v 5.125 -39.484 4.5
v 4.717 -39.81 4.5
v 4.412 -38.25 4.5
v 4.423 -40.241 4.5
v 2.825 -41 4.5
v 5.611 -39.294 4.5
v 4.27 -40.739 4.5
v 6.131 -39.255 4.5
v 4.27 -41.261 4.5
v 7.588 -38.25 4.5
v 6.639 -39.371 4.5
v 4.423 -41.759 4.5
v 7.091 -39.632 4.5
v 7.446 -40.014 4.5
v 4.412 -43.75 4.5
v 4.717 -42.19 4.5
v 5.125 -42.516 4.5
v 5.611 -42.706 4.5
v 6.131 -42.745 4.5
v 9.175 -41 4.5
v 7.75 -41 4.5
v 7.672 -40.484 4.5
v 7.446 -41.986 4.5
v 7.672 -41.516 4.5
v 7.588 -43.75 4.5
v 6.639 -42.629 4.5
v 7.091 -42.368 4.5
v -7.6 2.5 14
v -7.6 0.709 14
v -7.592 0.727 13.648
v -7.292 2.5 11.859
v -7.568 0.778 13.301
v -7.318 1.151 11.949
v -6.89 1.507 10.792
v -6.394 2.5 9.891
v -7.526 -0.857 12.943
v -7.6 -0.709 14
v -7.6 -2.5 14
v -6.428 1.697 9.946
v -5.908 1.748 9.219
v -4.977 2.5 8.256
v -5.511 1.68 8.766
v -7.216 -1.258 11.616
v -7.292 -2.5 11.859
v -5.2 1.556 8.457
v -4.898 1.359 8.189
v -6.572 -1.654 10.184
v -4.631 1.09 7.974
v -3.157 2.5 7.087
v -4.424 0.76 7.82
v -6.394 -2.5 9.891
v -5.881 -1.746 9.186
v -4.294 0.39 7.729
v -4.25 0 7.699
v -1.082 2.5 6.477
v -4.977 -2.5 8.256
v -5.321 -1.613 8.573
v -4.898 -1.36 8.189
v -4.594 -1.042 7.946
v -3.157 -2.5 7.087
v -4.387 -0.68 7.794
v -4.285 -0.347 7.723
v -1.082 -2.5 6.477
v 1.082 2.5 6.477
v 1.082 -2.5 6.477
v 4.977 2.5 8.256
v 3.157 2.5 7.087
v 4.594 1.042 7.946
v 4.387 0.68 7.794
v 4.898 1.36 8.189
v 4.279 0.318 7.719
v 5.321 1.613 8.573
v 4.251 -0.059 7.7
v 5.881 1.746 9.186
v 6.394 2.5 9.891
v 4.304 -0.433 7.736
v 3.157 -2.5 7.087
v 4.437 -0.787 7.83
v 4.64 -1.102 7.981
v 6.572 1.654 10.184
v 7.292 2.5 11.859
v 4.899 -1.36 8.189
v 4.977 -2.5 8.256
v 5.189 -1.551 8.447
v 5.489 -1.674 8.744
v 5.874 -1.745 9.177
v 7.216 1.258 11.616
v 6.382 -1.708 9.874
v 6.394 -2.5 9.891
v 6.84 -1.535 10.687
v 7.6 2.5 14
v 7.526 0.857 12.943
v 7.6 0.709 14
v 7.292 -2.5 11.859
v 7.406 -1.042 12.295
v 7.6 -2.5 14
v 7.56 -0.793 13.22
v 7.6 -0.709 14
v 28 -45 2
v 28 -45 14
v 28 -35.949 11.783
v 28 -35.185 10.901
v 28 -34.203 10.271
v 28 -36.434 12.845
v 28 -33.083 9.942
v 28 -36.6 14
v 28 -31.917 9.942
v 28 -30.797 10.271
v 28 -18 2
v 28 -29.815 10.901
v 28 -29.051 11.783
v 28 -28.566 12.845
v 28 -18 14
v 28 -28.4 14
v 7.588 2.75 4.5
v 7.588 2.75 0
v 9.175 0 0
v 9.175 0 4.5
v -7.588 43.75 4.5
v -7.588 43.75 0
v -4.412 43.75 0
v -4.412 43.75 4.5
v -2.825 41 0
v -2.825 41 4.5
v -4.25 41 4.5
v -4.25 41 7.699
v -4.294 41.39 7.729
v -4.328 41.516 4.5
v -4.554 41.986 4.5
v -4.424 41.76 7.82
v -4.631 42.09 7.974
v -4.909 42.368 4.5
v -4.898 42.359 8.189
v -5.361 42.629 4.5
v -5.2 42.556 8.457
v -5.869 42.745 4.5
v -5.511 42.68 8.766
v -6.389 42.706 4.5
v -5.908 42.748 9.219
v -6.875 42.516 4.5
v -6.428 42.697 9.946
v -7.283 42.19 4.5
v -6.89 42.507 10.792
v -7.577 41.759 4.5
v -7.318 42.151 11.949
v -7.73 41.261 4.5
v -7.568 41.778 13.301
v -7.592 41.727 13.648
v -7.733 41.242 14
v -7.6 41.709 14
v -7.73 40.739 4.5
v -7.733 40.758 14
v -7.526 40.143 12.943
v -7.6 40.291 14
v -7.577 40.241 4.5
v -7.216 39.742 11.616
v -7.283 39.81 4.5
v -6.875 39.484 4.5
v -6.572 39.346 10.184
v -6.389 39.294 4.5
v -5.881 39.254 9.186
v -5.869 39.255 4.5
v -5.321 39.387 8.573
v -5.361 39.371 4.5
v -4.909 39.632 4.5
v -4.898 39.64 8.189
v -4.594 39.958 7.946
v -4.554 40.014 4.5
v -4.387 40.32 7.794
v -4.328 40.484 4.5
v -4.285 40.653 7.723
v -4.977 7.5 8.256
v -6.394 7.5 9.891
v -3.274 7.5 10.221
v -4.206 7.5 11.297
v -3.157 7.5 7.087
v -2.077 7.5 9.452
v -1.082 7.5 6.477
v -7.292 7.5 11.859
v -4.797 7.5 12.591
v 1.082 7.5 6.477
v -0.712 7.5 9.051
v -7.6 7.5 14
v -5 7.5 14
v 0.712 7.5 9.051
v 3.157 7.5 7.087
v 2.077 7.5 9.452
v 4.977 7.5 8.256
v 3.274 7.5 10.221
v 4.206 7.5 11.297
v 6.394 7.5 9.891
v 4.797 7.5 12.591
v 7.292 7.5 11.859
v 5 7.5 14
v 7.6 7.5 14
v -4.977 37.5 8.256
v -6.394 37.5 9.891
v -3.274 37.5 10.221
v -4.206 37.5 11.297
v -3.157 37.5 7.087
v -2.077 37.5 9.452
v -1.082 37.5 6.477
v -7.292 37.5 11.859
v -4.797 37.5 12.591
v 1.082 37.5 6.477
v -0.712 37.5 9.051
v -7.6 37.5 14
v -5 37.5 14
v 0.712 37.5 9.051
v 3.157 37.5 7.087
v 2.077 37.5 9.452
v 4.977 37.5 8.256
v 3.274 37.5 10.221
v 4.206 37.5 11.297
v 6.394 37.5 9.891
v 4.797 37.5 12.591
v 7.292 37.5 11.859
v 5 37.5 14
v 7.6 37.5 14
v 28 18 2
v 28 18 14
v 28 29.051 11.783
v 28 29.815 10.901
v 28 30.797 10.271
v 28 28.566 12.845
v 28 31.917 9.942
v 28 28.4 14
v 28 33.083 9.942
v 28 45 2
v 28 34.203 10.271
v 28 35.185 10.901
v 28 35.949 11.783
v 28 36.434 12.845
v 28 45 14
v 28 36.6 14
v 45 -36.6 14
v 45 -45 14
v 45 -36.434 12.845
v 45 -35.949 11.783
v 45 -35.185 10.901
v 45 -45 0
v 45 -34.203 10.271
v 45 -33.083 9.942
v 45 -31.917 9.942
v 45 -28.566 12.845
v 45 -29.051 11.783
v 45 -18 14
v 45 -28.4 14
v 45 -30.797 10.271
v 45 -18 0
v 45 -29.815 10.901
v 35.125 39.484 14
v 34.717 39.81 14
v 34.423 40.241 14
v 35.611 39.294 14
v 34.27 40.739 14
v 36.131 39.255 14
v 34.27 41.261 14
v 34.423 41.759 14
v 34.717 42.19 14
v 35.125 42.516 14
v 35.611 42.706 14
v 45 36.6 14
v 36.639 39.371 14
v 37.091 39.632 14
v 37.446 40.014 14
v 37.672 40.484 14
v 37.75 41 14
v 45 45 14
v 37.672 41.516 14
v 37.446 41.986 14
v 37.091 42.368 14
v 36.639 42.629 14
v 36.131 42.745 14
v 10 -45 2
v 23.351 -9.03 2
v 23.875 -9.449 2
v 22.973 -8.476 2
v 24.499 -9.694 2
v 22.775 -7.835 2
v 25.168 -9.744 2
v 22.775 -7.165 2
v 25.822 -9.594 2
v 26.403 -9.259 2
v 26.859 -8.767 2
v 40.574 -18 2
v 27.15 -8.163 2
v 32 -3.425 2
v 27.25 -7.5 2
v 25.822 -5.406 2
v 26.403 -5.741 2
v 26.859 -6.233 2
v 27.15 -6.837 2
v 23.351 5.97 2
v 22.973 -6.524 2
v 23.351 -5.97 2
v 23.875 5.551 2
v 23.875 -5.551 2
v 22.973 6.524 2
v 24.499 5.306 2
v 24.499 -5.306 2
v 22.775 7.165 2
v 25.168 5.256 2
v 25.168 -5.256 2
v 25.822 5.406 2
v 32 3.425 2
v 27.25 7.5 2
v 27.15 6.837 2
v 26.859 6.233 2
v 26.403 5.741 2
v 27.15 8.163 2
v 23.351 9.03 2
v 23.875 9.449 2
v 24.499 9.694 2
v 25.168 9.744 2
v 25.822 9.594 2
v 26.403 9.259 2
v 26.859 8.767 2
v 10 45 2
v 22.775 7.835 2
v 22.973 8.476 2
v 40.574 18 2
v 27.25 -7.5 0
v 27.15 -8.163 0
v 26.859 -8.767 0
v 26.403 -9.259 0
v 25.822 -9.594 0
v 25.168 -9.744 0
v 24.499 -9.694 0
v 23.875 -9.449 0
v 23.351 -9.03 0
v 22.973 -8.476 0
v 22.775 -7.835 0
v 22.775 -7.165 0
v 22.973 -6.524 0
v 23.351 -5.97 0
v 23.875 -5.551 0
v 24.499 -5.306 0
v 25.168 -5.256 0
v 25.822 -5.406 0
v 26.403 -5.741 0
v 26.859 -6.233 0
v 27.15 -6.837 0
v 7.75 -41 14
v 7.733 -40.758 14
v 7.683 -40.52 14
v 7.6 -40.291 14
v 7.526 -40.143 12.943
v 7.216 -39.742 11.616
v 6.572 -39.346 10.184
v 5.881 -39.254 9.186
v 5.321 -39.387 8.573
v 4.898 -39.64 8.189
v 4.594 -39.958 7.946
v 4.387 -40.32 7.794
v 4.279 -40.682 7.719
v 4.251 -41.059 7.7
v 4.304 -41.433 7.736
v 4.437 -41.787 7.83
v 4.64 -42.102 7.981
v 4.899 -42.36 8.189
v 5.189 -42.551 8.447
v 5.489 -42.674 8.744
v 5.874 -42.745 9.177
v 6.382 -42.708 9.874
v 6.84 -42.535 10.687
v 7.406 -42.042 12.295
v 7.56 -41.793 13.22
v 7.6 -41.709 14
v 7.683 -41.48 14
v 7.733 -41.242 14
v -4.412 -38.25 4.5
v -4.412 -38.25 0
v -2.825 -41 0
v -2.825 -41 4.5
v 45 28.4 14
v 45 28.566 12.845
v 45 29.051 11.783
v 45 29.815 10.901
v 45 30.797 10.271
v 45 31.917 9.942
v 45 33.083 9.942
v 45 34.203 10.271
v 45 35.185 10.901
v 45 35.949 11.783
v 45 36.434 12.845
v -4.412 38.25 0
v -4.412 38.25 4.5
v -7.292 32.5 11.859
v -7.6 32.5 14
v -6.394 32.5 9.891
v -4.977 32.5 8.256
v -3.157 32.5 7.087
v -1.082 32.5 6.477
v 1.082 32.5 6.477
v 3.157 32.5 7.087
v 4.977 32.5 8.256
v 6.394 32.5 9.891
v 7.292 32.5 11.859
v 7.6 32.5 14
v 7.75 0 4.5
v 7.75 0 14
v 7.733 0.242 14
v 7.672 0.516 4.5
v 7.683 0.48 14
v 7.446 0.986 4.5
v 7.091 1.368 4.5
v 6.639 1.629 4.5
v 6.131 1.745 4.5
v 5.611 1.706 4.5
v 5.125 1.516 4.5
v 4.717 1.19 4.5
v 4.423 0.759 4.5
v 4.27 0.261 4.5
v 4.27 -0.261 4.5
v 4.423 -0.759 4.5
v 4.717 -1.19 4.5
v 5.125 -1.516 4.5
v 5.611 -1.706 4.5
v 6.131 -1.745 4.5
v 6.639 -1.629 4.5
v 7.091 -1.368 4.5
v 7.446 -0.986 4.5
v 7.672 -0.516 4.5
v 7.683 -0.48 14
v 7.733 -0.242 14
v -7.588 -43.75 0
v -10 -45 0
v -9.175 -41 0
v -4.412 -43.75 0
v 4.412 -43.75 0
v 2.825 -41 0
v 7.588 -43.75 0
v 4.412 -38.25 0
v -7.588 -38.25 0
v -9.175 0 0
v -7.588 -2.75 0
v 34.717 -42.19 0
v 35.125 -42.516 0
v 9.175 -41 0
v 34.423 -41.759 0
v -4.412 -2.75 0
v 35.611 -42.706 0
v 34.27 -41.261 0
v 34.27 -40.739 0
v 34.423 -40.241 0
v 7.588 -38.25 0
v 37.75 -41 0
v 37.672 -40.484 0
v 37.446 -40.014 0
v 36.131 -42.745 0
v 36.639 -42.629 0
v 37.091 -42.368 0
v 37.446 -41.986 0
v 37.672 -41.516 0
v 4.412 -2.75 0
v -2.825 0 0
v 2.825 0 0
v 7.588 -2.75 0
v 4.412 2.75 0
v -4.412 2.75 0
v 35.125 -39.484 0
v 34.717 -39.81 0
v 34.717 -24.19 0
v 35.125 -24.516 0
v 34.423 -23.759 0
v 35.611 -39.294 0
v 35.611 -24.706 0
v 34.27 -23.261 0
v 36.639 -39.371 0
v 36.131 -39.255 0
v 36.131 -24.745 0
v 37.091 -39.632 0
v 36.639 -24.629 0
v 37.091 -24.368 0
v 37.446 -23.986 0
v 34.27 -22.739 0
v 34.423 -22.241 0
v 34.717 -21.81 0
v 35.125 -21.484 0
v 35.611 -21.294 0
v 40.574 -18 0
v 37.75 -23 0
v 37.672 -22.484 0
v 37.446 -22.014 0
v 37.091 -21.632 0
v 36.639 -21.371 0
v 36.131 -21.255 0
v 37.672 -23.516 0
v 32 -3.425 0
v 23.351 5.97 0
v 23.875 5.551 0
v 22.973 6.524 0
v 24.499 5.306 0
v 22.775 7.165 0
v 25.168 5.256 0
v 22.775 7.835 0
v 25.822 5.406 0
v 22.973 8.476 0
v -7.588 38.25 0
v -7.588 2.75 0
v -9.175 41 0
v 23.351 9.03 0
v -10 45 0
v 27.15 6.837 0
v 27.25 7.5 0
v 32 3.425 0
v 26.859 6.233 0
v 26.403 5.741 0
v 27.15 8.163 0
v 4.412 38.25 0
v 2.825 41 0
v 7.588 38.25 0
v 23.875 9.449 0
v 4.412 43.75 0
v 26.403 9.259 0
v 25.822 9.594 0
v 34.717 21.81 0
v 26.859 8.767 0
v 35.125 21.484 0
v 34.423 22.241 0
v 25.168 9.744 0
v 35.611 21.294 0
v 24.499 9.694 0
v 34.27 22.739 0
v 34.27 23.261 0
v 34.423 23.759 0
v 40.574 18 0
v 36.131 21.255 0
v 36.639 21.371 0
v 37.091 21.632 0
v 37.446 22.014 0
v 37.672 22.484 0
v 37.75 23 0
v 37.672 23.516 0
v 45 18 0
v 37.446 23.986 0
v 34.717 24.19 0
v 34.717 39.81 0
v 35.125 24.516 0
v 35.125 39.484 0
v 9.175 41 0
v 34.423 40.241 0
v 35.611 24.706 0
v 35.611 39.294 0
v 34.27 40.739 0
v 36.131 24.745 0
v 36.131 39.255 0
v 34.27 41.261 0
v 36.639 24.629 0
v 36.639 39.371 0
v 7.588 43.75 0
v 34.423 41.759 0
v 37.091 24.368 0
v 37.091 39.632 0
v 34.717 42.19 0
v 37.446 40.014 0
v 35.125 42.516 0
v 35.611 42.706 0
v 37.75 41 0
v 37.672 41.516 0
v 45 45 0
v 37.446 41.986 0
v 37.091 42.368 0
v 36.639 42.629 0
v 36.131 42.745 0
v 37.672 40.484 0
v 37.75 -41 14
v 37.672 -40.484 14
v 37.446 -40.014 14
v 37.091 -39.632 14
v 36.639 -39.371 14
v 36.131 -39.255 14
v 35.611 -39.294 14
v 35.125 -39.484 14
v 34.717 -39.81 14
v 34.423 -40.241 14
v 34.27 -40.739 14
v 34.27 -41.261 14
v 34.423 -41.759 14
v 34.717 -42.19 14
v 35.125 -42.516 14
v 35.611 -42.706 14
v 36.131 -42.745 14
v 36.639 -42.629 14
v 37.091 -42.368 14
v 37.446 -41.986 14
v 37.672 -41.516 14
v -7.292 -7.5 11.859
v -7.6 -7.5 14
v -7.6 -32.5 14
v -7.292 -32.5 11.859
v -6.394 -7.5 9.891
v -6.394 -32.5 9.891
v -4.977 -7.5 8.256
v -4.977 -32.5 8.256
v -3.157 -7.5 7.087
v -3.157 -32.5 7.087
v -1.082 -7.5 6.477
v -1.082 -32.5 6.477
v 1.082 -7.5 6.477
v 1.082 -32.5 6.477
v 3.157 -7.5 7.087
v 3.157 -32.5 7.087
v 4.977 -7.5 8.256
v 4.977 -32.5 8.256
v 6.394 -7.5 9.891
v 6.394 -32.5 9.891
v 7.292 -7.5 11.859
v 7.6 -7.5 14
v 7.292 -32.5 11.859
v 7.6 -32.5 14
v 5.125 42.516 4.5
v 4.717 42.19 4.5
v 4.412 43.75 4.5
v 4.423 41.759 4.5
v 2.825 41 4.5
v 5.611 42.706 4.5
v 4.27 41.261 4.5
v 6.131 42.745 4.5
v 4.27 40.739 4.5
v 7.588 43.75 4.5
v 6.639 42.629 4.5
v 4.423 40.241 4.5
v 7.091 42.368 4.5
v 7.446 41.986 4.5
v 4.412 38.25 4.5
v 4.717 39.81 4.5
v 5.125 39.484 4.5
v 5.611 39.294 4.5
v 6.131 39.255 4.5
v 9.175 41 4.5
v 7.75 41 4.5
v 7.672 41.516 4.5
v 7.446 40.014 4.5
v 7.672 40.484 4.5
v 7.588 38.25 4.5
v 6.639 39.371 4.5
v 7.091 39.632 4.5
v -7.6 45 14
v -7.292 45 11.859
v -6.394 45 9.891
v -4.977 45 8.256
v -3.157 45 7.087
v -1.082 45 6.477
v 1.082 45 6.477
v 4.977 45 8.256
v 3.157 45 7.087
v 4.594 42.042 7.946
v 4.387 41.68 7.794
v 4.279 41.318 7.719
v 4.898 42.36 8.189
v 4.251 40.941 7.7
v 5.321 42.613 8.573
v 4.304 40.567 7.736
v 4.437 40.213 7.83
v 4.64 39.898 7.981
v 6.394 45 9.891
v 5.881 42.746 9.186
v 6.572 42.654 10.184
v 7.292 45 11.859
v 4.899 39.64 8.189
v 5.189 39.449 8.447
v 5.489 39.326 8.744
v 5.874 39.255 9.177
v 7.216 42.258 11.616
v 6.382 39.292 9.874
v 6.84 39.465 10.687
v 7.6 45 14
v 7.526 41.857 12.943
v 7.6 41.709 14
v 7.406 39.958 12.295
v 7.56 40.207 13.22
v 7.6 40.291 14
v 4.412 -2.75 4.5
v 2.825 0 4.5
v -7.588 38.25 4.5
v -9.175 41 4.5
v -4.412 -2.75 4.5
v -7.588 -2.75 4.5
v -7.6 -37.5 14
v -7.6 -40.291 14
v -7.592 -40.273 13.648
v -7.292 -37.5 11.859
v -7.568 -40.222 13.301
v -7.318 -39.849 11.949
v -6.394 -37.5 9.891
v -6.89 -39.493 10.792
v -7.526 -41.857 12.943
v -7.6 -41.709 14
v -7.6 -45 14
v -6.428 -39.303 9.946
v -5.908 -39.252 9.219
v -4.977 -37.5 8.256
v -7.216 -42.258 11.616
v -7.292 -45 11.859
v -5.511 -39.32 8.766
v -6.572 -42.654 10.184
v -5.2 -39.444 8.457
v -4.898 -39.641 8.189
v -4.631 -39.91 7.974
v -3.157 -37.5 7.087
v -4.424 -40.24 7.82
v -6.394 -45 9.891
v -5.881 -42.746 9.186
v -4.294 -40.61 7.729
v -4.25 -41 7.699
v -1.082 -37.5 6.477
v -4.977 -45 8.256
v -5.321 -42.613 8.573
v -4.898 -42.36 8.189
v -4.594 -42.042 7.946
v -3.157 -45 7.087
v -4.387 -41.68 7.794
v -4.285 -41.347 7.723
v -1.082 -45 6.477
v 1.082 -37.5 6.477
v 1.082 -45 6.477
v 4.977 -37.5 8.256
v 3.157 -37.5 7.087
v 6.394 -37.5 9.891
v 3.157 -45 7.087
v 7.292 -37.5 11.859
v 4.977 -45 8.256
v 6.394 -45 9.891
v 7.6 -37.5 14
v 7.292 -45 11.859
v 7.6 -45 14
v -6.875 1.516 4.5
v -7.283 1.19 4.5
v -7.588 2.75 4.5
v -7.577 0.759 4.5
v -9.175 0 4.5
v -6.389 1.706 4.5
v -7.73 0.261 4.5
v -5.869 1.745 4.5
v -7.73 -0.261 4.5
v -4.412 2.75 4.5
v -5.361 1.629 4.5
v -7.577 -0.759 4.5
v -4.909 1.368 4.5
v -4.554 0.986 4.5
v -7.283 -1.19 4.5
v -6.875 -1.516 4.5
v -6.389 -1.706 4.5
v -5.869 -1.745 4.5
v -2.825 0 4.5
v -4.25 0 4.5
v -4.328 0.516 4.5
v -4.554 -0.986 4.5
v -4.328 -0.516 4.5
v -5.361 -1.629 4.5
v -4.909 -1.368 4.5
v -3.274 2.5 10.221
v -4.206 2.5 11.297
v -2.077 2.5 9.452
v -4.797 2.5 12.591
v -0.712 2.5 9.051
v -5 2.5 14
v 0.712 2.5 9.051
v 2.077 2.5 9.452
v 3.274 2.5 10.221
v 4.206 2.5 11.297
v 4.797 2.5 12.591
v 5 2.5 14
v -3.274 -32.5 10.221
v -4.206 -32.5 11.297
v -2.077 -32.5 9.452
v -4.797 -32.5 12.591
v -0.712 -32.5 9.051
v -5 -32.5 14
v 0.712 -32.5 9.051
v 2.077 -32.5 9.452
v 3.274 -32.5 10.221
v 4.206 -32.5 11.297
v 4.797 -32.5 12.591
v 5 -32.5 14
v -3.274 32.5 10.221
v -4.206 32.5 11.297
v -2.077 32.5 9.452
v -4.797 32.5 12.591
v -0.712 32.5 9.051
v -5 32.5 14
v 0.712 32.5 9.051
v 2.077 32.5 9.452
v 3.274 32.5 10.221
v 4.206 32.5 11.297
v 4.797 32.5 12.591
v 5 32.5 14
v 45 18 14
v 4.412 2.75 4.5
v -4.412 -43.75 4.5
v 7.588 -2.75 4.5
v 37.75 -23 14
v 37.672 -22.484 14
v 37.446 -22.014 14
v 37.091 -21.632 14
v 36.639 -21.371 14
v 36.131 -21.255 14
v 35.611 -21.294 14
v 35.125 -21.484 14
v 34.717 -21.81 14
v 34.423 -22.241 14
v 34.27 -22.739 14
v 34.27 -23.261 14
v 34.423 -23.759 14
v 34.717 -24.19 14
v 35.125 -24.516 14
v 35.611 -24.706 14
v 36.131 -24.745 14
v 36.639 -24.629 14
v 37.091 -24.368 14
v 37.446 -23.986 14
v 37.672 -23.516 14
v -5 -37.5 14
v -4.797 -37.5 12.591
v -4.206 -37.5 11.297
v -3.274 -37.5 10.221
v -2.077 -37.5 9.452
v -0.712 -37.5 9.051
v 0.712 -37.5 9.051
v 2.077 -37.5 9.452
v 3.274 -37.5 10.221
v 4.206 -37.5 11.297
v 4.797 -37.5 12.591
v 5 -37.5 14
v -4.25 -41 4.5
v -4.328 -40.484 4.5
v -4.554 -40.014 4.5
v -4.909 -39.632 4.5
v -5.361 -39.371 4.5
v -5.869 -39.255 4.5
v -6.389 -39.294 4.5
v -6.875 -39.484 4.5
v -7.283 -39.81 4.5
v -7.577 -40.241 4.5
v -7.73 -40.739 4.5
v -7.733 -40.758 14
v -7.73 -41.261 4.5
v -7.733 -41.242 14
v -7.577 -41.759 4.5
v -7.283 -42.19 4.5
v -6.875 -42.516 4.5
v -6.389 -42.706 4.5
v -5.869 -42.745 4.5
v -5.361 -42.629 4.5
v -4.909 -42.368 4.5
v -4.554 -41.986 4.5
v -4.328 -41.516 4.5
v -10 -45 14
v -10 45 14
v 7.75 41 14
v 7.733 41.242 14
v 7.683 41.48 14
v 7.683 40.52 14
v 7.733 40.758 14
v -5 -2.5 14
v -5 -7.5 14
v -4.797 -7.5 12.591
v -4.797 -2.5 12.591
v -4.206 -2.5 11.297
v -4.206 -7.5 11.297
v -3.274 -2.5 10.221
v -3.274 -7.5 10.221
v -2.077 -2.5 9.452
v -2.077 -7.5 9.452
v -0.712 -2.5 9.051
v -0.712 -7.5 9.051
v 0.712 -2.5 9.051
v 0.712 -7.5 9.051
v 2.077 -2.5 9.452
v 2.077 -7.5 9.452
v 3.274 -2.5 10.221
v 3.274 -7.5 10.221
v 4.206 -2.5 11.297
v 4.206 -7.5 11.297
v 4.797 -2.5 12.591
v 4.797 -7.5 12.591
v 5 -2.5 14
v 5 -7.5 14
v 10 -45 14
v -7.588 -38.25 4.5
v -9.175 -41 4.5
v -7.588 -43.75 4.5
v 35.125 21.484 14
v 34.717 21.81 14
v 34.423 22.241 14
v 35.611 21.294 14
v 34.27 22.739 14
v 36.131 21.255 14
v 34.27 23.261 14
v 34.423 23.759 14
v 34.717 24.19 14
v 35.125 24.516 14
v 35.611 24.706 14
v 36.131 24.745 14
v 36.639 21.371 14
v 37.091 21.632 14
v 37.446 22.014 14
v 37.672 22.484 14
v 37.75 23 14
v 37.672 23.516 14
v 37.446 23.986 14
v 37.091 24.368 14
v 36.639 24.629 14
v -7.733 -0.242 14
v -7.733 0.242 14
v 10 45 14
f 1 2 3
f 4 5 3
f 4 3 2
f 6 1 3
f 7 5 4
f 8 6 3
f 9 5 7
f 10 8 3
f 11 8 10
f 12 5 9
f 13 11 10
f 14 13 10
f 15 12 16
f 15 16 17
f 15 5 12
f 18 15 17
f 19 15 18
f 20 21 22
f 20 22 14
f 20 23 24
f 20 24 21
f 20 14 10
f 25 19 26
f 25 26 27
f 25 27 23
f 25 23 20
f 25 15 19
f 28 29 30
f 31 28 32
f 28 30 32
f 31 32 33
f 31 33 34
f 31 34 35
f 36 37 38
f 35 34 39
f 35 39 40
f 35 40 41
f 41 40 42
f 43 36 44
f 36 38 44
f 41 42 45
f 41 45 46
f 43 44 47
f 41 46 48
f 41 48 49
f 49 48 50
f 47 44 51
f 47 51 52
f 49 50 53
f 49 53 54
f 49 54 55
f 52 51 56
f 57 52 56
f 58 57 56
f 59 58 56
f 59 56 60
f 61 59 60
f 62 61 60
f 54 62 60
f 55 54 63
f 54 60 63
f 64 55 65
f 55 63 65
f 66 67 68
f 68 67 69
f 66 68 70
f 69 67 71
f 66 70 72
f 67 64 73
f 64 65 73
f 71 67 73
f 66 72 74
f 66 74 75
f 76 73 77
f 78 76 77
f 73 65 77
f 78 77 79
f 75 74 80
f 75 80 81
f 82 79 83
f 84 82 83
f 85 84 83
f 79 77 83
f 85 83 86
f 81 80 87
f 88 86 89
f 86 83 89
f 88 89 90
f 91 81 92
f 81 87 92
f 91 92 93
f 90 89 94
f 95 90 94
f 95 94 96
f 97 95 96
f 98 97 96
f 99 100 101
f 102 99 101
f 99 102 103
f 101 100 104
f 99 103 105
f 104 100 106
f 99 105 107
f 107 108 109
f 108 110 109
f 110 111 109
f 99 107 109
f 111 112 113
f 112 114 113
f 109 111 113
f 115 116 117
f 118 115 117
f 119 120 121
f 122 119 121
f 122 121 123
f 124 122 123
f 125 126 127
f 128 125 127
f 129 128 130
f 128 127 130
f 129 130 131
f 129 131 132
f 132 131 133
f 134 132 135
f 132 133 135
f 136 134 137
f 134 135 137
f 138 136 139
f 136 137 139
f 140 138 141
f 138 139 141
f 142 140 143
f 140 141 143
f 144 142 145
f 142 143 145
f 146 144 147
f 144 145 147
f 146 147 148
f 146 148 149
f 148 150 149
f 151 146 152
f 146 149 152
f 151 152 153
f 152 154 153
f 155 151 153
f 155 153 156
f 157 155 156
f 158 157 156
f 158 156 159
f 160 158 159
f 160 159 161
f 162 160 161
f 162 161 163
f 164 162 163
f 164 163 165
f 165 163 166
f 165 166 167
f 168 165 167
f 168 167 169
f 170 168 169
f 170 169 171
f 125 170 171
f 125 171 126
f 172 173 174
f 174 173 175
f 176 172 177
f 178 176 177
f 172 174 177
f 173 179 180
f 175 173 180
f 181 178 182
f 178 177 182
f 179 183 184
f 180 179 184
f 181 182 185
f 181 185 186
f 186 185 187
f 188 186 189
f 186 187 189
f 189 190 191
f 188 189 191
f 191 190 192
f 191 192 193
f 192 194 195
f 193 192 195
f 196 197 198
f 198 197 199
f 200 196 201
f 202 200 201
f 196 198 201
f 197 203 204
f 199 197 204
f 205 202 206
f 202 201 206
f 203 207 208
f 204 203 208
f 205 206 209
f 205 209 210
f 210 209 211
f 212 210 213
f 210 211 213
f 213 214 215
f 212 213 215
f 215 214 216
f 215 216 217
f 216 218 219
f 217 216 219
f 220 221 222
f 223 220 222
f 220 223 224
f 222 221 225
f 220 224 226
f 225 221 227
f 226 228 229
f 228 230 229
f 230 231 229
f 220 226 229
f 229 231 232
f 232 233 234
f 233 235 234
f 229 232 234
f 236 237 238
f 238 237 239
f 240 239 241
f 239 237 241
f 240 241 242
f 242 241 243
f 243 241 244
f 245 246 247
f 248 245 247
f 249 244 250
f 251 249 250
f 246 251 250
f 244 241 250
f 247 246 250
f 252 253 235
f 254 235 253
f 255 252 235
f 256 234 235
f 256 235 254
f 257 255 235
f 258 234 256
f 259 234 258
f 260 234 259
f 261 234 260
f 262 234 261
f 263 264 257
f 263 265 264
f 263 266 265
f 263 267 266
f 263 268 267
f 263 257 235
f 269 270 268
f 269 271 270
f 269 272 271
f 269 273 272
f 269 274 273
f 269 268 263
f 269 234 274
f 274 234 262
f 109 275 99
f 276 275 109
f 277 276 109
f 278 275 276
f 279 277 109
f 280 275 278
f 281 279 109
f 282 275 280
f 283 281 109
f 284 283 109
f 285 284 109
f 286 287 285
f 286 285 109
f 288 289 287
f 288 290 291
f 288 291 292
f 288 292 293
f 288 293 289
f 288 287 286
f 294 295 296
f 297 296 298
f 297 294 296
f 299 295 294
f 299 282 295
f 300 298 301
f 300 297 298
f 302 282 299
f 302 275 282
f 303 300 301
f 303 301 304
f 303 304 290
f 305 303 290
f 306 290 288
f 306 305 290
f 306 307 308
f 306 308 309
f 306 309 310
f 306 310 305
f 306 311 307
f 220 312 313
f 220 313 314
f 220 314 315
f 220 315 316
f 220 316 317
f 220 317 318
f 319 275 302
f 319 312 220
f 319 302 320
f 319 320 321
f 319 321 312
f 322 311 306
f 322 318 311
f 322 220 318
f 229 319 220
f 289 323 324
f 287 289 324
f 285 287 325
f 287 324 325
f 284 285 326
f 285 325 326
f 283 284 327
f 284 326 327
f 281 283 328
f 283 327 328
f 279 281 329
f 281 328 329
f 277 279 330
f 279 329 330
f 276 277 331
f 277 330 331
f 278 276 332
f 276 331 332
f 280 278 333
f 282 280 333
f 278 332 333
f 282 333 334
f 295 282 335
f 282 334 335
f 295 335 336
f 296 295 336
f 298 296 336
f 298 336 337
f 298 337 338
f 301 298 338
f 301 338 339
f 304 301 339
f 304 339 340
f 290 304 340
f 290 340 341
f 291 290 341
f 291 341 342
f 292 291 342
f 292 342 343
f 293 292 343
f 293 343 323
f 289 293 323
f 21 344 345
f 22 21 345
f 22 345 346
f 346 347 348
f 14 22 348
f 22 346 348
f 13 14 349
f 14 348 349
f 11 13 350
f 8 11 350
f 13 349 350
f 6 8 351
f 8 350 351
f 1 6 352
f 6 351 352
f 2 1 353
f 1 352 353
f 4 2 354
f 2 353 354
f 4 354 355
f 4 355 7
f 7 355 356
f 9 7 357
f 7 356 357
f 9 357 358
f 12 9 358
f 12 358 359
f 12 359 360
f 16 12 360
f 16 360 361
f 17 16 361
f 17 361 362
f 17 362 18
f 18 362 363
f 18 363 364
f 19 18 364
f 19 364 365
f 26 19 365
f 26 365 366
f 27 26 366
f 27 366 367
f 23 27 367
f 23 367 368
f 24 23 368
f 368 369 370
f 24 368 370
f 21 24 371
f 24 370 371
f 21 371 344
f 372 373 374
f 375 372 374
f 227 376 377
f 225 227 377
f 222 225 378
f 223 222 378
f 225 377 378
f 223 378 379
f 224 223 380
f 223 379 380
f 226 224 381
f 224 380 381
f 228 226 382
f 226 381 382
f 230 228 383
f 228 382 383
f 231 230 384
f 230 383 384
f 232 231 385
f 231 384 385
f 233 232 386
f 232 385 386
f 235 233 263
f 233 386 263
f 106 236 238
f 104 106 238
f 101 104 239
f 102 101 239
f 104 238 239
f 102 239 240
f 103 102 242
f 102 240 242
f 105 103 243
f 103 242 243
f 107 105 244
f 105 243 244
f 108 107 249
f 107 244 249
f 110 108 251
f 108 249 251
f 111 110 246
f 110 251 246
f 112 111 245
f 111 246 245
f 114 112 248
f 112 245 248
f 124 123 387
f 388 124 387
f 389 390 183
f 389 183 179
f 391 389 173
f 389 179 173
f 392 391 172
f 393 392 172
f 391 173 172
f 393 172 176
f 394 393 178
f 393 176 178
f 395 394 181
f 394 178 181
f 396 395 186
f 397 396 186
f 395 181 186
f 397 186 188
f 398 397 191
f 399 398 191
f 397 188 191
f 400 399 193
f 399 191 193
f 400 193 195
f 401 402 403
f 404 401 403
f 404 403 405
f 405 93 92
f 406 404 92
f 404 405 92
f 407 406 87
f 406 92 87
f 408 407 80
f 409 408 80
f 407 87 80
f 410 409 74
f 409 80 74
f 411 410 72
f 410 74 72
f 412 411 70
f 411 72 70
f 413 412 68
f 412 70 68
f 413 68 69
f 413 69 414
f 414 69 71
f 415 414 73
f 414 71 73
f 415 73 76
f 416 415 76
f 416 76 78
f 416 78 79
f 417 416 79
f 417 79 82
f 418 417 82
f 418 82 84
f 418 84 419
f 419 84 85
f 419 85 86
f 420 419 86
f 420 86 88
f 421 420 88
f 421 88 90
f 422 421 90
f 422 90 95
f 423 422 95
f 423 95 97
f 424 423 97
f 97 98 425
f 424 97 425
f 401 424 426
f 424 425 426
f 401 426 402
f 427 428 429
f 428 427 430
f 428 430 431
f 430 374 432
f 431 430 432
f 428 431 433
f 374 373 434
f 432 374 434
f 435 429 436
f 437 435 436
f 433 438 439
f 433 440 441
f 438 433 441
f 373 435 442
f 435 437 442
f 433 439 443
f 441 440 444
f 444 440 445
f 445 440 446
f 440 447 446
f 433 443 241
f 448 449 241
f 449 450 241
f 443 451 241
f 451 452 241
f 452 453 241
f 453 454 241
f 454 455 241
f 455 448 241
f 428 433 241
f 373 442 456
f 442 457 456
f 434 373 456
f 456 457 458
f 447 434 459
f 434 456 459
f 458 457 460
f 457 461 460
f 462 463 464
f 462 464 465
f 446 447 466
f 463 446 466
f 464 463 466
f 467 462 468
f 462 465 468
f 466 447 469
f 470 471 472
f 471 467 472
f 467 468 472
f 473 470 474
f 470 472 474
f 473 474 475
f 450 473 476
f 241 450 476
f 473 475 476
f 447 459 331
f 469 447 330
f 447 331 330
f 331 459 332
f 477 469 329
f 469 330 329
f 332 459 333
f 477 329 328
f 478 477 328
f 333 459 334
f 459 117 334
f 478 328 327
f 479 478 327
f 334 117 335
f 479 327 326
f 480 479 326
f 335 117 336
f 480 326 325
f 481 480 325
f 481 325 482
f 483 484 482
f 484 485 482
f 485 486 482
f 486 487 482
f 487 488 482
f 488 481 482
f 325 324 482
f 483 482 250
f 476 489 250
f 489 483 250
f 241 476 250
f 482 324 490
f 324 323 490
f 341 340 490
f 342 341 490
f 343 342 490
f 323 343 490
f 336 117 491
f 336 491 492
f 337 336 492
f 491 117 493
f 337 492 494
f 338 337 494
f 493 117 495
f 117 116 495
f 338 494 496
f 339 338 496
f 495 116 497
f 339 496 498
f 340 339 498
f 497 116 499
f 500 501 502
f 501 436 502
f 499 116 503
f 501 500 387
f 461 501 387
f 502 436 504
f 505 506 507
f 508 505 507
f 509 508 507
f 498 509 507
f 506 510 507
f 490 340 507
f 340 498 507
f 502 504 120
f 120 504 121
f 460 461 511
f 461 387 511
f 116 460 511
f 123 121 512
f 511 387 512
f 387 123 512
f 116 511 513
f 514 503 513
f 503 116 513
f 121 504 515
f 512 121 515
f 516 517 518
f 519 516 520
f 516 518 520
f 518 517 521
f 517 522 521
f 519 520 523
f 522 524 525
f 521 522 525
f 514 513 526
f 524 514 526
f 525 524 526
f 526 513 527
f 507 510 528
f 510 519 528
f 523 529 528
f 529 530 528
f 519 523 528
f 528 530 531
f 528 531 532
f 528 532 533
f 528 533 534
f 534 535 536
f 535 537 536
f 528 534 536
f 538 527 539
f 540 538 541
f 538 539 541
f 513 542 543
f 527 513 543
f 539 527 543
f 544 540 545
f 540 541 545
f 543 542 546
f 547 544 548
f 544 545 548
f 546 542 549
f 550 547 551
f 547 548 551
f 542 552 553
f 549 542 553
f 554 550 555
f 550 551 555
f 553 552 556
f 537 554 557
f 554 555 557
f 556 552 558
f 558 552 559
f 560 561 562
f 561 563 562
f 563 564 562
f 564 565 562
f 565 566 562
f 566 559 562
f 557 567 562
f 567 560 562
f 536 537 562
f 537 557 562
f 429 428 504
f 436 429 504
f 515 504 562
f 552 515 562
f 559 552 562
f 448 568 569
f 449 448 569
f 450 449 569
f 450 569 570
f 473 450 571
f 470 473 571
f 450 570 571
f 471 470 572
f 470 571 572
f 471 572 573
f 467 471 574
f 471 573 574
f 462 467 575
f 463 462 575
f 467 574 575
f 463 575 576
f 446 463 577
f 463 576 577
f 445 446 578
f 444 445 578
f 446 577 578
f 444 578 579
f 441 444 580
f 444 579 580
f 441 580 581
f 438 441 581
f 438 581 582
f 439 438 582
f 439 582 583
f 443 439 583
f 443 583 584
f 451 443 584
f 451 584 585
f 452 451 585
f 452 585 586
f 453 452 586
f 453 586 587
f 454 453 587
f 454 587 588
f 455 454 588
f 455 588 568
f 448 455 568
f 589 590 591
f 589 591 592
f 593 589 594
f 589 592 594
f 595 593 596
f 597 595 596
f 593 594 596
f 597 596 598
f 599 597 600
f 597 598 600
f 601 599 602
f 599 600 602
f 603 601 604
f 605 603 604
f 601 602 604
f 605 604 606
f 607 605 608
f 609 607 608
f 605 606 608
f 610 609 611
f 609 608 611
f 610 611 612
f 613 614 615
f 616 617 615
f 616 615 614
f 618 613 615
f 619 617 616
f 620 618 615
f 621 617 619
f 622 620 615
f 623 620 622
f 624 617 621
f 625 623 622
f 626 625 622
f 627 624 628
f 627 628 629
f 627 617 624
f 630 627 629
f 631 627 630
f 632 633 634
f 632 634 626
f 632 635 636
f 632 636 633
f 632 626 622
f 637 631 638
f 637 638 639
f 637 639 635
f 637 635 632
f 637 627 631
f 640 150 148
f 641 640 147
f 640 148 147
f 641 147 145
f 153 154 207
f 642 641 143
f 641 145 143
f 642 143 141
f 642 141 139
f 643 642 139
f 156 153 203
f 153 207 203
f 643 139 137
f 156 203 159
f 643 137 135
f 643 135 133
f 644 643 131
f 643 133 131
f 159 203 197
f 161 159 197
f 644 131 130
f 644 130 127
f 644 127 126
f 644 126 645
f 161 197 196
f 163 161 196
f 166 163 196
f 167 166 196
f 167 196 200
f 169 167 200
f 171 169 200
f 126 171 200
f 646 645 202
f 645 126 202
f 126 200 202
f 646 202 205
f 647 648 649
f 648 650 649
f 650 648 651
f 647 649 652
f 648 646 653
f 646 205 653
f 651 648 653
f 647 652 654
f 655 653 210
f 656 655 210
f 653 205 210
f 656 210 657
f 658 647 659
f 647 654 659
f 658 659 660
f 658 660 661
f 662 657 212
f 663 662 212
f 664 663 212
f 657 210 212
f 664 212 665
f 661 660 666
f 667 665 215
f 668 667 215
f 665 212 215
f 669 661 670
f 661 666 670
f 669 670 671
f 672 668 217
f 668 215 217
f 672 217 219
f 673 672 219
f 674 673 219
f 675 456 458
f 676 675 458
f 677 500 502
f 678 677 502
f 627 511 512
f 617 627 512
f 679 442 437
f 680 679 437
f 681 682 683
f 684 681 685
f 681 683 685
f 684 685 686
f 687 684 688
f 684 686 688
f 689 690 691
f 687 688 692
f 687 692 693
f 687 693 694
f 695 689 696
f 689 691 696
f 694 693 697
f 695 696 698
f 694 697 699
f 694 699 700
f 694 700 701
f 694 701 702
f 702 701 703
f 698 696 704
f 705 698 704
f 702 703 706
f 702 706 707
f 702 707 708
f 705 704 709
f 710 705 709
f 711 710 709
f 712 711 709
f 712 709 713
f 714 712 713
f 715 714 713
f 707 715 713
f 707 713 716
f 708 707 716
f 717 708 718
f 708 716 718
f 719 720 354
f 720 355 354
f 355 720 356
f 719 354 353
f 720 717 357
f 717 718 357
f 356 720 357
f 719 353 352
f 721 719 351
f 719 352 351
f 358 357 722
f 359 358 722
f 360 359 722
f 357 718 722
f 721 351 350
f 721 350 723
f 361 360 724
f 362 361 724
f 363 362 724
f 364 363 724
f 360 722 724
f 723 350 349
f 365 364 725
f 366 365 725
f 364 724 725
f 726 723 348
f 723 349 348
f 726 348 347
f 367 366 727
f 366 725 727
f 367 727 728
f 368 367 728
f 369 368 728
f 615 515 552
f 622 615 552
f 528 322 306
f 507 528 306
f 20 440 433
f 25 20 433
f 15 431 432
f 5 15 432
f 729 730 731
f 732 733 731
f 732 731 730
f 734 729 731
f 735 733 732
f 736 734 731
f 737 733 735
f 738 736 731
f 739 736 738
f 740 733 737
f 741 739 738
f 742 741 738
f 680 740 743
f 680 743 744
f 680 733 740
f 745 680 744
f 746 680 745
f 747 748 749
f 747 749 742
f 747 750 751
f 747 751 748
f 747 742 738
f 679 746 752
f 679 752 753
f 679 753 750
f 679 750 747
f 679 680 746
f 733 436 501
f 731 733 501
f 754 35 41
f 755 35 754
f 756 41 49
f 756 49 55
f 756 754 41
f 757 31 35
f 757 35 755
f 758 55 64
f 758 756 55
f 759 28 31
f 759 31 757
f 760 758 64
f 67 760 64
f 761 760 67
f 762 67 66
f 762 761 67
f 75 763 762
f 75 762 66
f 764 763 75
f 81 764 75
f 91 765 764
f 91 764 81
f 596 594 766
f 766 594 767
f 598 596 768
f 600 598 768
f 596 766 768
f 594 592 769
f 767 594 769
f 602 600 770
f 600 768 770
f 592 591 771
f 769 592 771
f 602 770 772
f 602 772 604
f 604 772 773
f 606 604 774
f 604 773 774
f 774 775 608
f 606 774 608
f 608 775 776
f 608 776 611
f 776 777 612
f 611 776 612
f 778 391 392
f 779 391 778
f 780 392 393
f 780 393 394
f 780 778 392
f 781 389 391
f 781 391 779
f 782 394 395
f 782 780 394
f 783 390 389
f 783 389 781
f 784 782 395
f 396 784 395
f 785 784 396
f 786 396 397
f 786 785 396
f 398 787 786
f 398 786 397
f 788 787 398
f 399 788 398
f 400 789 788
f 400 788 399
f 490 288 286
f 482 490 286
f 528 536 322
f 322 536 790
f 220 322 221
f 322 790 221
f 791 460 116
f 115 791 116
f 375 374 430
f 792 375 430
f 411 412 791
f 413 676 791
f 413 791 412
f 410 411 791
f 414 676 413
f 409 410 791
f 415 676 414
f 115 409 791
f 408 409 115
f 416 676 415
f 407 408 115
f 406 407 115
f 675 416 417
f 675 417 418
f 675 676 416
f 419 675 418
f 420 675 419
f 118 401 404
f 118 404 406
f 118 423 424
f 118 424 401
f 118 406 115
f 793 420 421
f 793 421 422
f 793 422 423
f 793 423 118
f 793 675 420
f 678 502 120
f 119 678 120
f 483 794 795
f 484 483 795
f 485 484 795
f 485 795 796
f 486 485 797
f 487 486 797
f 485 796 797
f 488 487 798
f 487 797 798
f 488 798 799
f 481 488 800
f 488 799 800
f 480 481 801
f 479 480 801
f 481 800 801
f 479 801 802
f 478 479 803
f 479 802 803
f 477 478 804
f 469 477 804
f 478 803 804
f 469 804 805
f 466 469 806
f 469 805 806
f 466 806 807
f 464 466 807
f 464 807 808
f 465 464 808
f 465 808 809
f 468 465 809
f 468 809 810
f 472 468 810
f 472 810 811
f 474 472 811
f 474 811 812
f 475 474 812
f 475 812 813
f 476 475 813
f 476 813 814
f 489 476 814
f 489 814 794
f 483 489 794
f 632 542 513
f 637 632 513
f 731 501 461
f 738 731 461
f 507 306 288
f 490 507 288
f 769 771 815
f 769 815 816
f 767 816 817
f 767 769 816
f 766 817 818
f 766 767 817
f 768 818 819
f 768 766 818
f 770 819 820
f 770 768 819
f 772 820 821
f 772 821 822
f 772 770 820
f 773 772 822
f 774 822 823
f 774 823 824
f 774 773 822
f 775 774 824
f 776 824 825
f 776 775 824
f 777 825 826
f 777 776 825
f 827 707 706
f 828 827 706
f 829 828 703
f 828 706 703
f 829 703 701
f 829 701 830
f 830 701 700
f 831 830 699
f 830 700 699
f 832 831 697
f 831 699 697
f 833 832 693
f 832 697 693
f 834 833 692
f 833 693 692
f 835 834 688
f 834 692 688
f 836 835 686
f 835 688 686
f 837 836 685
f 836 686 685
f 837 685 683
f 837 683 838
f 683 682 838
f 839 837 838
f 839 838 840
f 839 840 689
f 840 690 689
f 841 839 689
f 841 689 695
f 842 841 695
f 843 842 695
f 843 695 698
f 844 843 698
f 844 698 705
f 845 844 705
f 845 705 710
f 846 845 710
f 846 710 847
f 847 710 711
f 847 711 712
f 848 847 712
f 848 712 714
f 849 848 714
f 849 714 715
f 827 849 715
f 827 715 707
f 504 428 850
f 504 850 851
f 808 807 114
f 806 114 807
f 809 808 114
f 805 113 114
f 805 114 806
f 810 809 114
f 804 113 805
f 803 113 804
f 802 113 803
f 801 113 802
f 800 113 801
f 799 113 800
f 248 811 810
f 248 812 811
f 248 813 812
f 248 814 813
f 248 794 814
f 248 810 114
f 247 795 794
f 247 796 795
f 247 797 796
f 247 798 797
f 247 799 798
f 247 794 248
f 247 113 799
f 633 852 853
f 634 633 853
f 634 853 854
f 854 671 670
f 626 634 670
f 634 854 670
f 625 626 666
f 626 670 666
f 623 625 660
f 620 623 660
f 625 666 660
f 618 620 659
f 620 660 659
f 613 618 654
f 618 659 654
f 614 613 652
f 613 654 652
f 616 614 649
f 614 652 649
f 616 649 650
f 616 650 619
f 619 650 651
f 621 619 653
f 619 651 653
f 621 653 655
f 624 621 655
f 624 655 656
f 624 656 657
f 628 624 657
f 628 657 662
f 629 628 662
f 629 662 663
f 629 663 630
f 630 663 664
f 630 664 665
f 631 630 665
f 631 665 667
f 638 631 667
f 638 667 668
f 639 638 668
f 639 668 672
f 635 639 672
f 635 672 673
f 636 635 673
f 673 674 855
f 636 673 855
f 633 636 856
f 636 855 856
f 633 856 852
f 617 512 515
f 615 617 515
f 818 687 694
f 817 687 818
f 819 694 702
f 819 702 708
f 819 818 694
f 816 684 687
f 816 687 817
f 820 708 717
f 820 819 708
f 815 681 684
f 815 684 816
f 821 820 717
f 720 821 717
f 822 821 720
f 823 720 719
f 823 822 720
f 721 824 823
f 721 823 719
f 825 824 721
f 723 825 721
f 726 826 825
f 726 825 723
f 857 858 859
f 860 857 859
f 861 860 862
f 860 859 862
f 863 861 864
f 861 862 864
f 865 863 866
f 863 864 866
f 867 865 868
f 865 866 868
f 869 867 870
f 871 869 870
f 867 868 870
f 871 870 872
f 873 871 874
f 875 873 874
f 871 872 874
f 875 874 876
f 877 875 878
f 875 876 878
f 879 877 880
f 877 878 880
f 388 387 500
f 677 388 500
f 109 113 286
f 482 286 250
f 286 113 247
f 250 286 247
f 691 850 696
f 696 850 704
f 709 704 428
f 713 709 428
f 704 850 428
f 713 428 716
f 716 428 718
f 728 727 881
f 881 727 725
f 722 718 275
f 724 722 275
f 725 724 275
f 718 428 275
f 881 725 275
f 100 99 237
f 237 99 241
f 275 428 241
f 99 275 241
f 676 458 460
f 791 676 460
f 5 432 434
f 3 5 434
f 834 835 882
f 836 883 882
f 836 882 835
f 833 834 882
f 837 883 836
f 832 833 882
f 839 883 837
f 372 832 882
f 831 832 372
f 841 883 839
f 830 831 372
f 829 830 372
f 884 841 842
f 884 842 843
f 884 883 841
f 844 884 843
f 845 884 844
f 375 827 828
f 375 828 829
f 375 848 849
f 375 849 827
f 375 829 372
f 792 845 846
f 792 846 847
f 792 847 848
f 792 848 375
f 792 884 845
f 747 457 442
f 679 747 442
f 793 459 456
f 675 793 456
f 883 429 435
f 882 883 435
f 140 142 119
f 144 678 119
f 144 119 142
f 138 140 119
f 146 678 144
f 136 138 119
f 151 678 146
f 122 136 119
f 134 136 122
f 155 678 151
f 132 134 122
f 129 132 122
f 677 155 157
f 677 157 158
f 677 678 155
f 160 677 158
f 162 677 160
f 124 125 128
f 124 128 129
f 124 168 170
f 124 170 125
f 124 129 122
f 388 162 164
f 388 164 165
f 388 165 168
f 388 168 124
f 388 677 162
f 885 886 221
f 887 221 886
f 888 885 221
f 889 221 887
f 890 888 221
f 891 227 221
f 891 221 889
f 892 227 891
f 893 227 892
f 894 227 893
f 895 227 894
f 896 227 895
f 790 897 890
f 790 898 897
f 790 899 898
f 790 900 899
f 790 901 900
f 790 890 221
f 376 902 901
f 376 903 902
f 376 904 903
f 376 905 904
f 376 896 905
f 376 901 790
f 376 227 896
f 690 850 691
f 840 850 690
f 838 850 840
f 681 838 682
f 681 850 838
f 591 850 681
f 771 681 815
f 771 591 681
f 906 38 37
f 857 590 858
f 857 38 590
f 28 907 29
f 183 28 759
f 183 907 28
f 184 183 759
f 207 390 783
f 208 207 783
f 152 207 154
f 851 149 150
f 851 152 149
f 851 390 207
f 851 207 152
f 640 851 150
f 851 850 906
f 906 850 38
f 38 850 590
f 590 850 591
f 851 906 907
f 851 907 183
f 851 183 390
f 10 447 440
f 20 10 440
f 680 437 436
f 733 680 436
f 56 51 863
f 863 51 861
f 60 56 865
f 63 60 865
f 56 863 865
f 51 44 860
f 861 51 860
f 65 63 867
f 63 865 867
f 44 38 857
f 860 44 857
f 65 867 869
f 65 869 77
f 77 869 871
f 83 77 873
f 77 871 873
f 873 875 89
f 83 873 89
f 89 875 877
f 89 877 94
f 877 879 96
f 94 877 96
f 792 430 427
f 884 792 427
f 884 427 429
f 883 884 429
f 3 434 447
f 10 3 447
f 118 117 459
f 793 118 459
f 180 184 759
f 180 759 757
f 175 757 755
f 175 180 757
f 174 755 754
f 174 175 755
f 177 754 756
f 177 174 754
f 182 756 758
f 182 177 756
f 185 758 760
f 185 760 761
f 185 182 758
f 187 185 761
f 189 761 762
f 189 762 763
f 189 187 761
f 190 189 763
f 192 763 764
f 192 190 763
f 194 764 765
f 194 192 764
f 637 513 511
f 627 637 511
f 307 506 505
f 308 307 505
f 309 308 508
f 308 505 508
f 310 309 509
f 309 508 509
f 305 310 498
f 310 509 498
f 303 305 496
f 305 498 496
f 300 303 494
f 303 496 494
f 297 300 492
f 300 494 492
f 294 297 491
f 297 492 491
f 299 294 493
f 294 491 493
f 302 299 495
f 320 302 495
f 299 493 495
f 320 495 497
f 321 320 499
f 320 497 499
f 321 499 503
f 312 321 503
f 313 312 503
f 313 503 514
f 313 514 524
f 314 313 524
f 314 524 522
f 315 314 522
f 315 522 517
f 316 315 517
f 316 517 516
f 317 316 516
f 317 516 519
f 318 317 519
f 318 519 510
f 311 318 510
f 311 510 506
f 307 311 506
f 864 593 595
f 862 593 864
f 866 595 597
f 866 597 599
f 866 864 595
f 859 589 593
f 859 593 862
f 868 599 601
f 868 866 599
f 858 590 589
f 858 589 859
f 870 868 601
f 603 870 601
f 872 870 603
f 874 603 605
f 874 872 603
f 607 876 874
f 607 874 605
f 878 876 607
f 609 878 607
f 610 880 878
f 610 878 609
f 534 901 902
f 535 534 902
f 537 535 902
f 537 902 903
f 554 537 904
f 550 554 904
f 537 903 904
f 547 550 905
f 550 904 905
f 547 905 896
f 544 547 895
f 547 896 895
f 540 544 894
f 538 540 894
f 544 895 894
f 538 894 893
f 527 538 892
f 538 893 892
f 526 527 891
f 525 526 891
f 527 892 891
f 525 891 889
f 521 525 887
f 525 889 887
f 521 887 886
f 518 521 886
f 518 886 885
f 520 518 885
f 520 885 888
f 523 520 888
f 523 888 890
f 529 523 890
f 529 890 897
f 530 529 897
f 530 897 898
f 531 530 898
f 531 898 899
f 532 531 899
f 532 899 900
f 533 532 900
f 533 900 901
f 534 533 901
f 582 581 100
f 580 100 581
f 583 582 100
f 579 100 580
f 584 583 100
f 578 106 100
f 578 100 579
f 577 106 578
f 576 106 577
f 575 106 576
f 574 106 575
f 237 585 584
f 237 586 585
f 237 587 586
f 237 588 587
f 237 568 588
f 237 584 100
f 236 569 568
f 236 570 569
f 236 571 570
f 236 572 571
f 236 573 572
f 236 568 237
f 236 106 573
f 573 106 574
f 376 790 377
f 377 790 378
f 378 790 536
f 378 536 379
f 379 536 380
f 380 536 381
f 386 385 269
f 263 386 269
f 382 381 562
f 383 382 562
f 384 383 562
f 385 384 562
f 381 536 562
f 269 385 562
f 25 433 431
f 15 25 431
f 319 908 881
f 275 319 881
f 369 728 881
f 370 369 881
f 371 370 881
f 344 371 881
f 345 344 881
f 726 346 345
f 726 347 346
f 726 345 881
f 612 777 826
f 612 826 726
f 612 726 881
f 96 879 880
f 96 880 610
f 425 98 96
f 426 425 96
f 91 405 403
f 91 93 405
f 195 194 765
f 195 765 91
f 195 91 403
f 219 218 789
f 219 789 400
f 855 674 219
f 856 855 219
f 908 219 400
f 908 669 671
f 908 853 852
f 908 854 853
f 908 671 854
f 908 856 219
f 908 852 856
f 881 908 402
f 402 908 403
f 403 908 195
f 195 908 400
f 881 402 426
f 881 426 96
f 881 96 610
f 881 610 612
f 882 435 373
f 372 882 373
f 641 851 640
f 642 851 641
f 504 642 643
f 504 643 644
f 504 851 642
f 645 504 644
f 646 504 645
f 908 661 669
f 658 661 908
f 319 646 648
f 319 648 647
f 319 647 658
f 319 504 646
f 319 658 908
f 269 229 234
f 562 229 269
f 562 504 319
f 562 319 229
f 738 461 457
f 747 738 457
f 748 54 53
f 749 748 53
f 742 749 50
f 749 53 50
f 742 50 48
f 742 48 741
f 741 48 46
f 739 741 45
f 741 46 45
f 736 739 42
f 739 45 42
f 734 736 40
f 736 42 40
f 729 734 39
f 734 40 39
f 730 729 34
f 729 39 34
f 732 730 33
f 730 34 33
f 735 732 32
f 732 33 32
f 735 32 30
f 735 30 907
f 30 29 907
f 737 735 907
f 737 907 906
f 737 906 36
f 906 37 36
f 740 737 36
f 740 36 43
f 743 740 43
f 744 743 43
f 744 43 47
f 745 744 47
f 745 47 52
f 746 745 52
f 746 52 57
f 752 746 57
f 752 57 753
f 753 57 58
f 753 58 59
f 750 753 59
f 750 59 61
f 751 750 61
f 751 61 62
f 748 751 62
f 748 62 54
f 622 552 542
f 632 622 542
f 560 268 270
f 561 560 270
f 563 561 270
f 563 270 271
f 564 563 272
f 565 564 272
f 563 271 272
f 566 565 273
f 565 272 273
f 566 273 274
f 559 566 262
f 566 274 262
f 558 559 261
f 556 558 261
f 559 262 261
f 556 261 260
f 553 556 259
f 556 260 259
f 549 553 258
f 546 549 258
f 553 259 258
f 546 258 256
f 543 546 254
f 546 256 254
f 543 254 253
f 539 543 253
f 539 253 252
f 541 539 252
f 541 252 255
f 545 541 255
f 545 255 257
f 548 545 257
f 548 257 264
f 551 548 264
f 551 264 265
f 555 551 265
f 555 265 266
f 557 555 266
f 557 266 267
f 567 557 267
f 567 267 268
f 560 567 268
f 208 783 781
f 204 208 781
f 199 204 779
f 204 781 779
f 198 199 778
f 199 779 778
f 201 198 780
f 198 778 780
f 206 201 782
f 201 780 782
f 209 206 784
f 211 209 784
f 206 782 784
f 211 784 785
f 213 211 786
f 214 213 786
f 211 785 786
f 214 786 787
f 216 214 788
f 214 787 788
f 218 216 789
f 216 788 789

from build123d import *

# Parameters (mm, degrees)
PAD003_DEPTH    = 5
PAD001_DEPTH    = 5
PAD002_DEPTH    = 5
PAD004_DEPTH    = 5
SKETCH_W        = 55
SKETCH_H        = 90
PAD_DEPTH       = 14
SKETCH001_R     = 7.6
POCKET_DEPTH    = 90.001
SKETCH002_R     = 1.75
POCKET001_DEPTH = 14.001
POCKET002_DEPTH = 12
SKETCH004_R     = 2.25
POCKET003_DEPTH = 14.001
SKETCH008_R     = 4.1
POCKET005_DEPTH = 20
POCKET007_DEPTH = 4.5
POCKET008_DEPTH = 12.5


with BuildPart() as pad003:
    # Sketch020 → Pad003 (new body)
    with BuildSketch(Plane.XZ.offset(-32.5)):
        with BuildLine():
            ThreePointArc((-7.6, 14), (0, 6.4), (7.6, 14))
            Line((7.6, 14), (5, 14))
            ThreePointArc((-5, 14), (0, 9), (5, 14))
            Line((-7.6, 14), (-5, 14))
        make_face()
    extrude(amount=-PAD003_DEPTH)


with BuildPart() as pad001:
    # Sketch018 → Pad001 (new body)
    with BuildSketch(Plane.XZ.offset(-7.5)):
        with BuildLine():
            ThreePointArc((-7.6, 14), (0, 6.4), (7.6, 14))
            Line((7.6, 14), (5, 14))
            ThreePointArc((-5, 14), (0, 9), (5, 14))
            Line((-7.6, 14), (-5, 14))
        make_face()
    extrude(amount=PAD001_DEPTH)


with BuildPart() as pad002:
    # Sketch019 → Pad002 (new body)
    with BuildSketch(Plane.XZ.offset(7.5)):
        with BuildLine():
            ThreePointArc((-7.6, 14), (0, 6.4), (7.6, 14))
            Line((7.6, 14), (5, 14))
            ThreePointArc((-5, 14), (0, 9), (5, 14))
            Line((-7.6, 14), (-5, 14))
        make_face()
    extrude(amount=-PAD002_DEPTH)


with BuildPart() as pad004:
    # Sketch021 → Pad004 (new body)
    with BuildSketch(Plane.XZ.offset(32.5)):
        with BuildLine():
            ThreePointArc((-7.6, 14), (0, 6.4), (7.6, 14))
            Line((7.6, 14), (5, 14))
            ThreePointArc((-5, 14), (0, 9), (5, 14))
            Line((-7.6, 14), (-5, 14))
        make_face()
    extrude(amount=PAD004_DEPTH)


with BuildPart() as fusion:
    # Sketch → Pad (new body)
    with BuildSketch(Plane.XY):
        with Locations((17.5, 0)):
            Rectangle(SKETCH_W, SKETCH_H)
    extrude(amount=PAD_DEPTH)

    # Sketch001 → Pocket (cut, through all)
    with BuildSketch(Plane.XZ.offset(45)):
        with Locations((0, 14)):
            Circle(SKETCH001_R)
    extrude(amount=-POCKET_DEPTH, mode=Mode.SUBTRACT)

    # Sketch002 → Pocket001 (cut, through all)
    with BuildSketch(Plane.XY.offset(14)):
        with Locations((-6, 41)):
            Circle(SKETCH002_R)
        with Locations((-6, -41)):
            Circle(SKETCH002_R)
        with Locations((6, 41)):
            Circle(SKETCH002_R)
        with Locations((6, -41)):
            Circle(SKETCH002_R)
        with Locations((6, 0)):
            Circle(SKETCH002_R)
        with Locations((-6, 0)):
            Circle(SKETCH002_R)
        with Locations((36, 41)):
            Circle(SKETCH002_R)
        with Locations((36, 23)):
            Circle(SKETCH002_R)
        with Locations((36, -23)):
            Circle(SKETCH002_R)
        with Locations((36, -41)):
            Circle(SKETCH002_R)
    extrude(amount=-POCKET001_DEPTH, mode=Mode.SUBTRACT)

    # Sketch003 → Pocket002 (cut)
    with BuildSketch(Plane.XY.offset(14)):
        Polygon((10, 50), (10, -50), (28, -50), (28, -18), (48, -18), (48, 18), (28, 18), (28, 50), align=None)
    extrude(amount=-POCKET002_DEPTH, mode=Mode.SUBTRACT)

    # Sketch004 → Pocket003 (cut, through all)
    with BuildSketch(Plane(origin=(0, 0, 0), x_dir=(1, 0, 0), z_dir=(0, 0, -1))):
        with Locations((25, 7.5)):
            Circle(SKETCH004_R)
        with Locations((25, -7.5)):
            Circle(SKETCH004_R)
    extrude(amount=-POCKET003_DEPTH, mode=Mode.SUBTRACT)

    # Sketch008 → Pocket005 (cut)
    with BuildSketch(Plane.YZ.offset(45)):
        with Locations((-32.5, 14)):
            Circle(SKETCH008_R)
        with Locations((32.5, 14)):
            Circle(SKETCH008_R)
    extrude(amount=-POCKET005_DEPTH, mode=Mode.SUBTRACT)

    # Sketch012 → Pocket007 (cut)
    with BuildSketch(Plane(origin=(0, 0, 0), x_dir=(1, 0, 0), z_dir=(0, 0, -1))):
        Polygon((-4.412285, 2.750003), (-7.587715, 2.750003), (-9.17543, 0), (-7.587715, -2.750003), (-4.412285, -2.750003), (-2.82457, 0), align=None)
        Polygon((7.587715, 2.750003), (4.412285, 2.750003), (2.82457, 0), (4.412285, -2.750003), (7.587715, -2.750003), (9.17543, 0), align=None)
        Polygon((-4.412285, 43.750003), (-7.587715, 43.750003), (-9.17543, 41), (-7.587715, 38.249997), (-4.412285, 38.249997), (-2.82457, 41), align=None)
        Polygon((7.587715, -38.249997), (4.412285, -38.249997), (2.82457, -41), (4.412285, -43.750003), (7.587715, -43.750003), (9.17543, -41), align=None)
        Polygon((7.587715, 43.750003), (4.412285, 43.750003), (2.82457, 41), (4.412285, 38.249997), (7.587715, 38.249997), (9.17543, 41), align=None)
        Polygon((-4.412285, -38.249997), (-7.587715, -38.249997), (-9.17543, -41), (-7.587715, -43.750003), (-4.412285, -43.750003), (-2.82457, -41), align=None)
    extrude(amount=-POCKET007_DEPTH, mode=Mode.SUBTRACT)

    # Sketch022 → Pocket008 (cut, symmetric)
    with BuildSketch(Plane.XY.offset(2)):
        Polygon((40.573685, 18), (32, 3.425), (32, -3.425), (40.573685, -18), (51.573685, -18), (51.573685, 18), align=None)
    extrude(amount=POCKET008_DEPTH, both=True, mode=Mode.SUBTRACT)

    # Fusion: union Pad003, Pad001, Pad002, Pad004
    add(pad003.part)
    add(pad001.part)
    add(pad002.part)
    add(pad004.part)


solid = fusion.part
